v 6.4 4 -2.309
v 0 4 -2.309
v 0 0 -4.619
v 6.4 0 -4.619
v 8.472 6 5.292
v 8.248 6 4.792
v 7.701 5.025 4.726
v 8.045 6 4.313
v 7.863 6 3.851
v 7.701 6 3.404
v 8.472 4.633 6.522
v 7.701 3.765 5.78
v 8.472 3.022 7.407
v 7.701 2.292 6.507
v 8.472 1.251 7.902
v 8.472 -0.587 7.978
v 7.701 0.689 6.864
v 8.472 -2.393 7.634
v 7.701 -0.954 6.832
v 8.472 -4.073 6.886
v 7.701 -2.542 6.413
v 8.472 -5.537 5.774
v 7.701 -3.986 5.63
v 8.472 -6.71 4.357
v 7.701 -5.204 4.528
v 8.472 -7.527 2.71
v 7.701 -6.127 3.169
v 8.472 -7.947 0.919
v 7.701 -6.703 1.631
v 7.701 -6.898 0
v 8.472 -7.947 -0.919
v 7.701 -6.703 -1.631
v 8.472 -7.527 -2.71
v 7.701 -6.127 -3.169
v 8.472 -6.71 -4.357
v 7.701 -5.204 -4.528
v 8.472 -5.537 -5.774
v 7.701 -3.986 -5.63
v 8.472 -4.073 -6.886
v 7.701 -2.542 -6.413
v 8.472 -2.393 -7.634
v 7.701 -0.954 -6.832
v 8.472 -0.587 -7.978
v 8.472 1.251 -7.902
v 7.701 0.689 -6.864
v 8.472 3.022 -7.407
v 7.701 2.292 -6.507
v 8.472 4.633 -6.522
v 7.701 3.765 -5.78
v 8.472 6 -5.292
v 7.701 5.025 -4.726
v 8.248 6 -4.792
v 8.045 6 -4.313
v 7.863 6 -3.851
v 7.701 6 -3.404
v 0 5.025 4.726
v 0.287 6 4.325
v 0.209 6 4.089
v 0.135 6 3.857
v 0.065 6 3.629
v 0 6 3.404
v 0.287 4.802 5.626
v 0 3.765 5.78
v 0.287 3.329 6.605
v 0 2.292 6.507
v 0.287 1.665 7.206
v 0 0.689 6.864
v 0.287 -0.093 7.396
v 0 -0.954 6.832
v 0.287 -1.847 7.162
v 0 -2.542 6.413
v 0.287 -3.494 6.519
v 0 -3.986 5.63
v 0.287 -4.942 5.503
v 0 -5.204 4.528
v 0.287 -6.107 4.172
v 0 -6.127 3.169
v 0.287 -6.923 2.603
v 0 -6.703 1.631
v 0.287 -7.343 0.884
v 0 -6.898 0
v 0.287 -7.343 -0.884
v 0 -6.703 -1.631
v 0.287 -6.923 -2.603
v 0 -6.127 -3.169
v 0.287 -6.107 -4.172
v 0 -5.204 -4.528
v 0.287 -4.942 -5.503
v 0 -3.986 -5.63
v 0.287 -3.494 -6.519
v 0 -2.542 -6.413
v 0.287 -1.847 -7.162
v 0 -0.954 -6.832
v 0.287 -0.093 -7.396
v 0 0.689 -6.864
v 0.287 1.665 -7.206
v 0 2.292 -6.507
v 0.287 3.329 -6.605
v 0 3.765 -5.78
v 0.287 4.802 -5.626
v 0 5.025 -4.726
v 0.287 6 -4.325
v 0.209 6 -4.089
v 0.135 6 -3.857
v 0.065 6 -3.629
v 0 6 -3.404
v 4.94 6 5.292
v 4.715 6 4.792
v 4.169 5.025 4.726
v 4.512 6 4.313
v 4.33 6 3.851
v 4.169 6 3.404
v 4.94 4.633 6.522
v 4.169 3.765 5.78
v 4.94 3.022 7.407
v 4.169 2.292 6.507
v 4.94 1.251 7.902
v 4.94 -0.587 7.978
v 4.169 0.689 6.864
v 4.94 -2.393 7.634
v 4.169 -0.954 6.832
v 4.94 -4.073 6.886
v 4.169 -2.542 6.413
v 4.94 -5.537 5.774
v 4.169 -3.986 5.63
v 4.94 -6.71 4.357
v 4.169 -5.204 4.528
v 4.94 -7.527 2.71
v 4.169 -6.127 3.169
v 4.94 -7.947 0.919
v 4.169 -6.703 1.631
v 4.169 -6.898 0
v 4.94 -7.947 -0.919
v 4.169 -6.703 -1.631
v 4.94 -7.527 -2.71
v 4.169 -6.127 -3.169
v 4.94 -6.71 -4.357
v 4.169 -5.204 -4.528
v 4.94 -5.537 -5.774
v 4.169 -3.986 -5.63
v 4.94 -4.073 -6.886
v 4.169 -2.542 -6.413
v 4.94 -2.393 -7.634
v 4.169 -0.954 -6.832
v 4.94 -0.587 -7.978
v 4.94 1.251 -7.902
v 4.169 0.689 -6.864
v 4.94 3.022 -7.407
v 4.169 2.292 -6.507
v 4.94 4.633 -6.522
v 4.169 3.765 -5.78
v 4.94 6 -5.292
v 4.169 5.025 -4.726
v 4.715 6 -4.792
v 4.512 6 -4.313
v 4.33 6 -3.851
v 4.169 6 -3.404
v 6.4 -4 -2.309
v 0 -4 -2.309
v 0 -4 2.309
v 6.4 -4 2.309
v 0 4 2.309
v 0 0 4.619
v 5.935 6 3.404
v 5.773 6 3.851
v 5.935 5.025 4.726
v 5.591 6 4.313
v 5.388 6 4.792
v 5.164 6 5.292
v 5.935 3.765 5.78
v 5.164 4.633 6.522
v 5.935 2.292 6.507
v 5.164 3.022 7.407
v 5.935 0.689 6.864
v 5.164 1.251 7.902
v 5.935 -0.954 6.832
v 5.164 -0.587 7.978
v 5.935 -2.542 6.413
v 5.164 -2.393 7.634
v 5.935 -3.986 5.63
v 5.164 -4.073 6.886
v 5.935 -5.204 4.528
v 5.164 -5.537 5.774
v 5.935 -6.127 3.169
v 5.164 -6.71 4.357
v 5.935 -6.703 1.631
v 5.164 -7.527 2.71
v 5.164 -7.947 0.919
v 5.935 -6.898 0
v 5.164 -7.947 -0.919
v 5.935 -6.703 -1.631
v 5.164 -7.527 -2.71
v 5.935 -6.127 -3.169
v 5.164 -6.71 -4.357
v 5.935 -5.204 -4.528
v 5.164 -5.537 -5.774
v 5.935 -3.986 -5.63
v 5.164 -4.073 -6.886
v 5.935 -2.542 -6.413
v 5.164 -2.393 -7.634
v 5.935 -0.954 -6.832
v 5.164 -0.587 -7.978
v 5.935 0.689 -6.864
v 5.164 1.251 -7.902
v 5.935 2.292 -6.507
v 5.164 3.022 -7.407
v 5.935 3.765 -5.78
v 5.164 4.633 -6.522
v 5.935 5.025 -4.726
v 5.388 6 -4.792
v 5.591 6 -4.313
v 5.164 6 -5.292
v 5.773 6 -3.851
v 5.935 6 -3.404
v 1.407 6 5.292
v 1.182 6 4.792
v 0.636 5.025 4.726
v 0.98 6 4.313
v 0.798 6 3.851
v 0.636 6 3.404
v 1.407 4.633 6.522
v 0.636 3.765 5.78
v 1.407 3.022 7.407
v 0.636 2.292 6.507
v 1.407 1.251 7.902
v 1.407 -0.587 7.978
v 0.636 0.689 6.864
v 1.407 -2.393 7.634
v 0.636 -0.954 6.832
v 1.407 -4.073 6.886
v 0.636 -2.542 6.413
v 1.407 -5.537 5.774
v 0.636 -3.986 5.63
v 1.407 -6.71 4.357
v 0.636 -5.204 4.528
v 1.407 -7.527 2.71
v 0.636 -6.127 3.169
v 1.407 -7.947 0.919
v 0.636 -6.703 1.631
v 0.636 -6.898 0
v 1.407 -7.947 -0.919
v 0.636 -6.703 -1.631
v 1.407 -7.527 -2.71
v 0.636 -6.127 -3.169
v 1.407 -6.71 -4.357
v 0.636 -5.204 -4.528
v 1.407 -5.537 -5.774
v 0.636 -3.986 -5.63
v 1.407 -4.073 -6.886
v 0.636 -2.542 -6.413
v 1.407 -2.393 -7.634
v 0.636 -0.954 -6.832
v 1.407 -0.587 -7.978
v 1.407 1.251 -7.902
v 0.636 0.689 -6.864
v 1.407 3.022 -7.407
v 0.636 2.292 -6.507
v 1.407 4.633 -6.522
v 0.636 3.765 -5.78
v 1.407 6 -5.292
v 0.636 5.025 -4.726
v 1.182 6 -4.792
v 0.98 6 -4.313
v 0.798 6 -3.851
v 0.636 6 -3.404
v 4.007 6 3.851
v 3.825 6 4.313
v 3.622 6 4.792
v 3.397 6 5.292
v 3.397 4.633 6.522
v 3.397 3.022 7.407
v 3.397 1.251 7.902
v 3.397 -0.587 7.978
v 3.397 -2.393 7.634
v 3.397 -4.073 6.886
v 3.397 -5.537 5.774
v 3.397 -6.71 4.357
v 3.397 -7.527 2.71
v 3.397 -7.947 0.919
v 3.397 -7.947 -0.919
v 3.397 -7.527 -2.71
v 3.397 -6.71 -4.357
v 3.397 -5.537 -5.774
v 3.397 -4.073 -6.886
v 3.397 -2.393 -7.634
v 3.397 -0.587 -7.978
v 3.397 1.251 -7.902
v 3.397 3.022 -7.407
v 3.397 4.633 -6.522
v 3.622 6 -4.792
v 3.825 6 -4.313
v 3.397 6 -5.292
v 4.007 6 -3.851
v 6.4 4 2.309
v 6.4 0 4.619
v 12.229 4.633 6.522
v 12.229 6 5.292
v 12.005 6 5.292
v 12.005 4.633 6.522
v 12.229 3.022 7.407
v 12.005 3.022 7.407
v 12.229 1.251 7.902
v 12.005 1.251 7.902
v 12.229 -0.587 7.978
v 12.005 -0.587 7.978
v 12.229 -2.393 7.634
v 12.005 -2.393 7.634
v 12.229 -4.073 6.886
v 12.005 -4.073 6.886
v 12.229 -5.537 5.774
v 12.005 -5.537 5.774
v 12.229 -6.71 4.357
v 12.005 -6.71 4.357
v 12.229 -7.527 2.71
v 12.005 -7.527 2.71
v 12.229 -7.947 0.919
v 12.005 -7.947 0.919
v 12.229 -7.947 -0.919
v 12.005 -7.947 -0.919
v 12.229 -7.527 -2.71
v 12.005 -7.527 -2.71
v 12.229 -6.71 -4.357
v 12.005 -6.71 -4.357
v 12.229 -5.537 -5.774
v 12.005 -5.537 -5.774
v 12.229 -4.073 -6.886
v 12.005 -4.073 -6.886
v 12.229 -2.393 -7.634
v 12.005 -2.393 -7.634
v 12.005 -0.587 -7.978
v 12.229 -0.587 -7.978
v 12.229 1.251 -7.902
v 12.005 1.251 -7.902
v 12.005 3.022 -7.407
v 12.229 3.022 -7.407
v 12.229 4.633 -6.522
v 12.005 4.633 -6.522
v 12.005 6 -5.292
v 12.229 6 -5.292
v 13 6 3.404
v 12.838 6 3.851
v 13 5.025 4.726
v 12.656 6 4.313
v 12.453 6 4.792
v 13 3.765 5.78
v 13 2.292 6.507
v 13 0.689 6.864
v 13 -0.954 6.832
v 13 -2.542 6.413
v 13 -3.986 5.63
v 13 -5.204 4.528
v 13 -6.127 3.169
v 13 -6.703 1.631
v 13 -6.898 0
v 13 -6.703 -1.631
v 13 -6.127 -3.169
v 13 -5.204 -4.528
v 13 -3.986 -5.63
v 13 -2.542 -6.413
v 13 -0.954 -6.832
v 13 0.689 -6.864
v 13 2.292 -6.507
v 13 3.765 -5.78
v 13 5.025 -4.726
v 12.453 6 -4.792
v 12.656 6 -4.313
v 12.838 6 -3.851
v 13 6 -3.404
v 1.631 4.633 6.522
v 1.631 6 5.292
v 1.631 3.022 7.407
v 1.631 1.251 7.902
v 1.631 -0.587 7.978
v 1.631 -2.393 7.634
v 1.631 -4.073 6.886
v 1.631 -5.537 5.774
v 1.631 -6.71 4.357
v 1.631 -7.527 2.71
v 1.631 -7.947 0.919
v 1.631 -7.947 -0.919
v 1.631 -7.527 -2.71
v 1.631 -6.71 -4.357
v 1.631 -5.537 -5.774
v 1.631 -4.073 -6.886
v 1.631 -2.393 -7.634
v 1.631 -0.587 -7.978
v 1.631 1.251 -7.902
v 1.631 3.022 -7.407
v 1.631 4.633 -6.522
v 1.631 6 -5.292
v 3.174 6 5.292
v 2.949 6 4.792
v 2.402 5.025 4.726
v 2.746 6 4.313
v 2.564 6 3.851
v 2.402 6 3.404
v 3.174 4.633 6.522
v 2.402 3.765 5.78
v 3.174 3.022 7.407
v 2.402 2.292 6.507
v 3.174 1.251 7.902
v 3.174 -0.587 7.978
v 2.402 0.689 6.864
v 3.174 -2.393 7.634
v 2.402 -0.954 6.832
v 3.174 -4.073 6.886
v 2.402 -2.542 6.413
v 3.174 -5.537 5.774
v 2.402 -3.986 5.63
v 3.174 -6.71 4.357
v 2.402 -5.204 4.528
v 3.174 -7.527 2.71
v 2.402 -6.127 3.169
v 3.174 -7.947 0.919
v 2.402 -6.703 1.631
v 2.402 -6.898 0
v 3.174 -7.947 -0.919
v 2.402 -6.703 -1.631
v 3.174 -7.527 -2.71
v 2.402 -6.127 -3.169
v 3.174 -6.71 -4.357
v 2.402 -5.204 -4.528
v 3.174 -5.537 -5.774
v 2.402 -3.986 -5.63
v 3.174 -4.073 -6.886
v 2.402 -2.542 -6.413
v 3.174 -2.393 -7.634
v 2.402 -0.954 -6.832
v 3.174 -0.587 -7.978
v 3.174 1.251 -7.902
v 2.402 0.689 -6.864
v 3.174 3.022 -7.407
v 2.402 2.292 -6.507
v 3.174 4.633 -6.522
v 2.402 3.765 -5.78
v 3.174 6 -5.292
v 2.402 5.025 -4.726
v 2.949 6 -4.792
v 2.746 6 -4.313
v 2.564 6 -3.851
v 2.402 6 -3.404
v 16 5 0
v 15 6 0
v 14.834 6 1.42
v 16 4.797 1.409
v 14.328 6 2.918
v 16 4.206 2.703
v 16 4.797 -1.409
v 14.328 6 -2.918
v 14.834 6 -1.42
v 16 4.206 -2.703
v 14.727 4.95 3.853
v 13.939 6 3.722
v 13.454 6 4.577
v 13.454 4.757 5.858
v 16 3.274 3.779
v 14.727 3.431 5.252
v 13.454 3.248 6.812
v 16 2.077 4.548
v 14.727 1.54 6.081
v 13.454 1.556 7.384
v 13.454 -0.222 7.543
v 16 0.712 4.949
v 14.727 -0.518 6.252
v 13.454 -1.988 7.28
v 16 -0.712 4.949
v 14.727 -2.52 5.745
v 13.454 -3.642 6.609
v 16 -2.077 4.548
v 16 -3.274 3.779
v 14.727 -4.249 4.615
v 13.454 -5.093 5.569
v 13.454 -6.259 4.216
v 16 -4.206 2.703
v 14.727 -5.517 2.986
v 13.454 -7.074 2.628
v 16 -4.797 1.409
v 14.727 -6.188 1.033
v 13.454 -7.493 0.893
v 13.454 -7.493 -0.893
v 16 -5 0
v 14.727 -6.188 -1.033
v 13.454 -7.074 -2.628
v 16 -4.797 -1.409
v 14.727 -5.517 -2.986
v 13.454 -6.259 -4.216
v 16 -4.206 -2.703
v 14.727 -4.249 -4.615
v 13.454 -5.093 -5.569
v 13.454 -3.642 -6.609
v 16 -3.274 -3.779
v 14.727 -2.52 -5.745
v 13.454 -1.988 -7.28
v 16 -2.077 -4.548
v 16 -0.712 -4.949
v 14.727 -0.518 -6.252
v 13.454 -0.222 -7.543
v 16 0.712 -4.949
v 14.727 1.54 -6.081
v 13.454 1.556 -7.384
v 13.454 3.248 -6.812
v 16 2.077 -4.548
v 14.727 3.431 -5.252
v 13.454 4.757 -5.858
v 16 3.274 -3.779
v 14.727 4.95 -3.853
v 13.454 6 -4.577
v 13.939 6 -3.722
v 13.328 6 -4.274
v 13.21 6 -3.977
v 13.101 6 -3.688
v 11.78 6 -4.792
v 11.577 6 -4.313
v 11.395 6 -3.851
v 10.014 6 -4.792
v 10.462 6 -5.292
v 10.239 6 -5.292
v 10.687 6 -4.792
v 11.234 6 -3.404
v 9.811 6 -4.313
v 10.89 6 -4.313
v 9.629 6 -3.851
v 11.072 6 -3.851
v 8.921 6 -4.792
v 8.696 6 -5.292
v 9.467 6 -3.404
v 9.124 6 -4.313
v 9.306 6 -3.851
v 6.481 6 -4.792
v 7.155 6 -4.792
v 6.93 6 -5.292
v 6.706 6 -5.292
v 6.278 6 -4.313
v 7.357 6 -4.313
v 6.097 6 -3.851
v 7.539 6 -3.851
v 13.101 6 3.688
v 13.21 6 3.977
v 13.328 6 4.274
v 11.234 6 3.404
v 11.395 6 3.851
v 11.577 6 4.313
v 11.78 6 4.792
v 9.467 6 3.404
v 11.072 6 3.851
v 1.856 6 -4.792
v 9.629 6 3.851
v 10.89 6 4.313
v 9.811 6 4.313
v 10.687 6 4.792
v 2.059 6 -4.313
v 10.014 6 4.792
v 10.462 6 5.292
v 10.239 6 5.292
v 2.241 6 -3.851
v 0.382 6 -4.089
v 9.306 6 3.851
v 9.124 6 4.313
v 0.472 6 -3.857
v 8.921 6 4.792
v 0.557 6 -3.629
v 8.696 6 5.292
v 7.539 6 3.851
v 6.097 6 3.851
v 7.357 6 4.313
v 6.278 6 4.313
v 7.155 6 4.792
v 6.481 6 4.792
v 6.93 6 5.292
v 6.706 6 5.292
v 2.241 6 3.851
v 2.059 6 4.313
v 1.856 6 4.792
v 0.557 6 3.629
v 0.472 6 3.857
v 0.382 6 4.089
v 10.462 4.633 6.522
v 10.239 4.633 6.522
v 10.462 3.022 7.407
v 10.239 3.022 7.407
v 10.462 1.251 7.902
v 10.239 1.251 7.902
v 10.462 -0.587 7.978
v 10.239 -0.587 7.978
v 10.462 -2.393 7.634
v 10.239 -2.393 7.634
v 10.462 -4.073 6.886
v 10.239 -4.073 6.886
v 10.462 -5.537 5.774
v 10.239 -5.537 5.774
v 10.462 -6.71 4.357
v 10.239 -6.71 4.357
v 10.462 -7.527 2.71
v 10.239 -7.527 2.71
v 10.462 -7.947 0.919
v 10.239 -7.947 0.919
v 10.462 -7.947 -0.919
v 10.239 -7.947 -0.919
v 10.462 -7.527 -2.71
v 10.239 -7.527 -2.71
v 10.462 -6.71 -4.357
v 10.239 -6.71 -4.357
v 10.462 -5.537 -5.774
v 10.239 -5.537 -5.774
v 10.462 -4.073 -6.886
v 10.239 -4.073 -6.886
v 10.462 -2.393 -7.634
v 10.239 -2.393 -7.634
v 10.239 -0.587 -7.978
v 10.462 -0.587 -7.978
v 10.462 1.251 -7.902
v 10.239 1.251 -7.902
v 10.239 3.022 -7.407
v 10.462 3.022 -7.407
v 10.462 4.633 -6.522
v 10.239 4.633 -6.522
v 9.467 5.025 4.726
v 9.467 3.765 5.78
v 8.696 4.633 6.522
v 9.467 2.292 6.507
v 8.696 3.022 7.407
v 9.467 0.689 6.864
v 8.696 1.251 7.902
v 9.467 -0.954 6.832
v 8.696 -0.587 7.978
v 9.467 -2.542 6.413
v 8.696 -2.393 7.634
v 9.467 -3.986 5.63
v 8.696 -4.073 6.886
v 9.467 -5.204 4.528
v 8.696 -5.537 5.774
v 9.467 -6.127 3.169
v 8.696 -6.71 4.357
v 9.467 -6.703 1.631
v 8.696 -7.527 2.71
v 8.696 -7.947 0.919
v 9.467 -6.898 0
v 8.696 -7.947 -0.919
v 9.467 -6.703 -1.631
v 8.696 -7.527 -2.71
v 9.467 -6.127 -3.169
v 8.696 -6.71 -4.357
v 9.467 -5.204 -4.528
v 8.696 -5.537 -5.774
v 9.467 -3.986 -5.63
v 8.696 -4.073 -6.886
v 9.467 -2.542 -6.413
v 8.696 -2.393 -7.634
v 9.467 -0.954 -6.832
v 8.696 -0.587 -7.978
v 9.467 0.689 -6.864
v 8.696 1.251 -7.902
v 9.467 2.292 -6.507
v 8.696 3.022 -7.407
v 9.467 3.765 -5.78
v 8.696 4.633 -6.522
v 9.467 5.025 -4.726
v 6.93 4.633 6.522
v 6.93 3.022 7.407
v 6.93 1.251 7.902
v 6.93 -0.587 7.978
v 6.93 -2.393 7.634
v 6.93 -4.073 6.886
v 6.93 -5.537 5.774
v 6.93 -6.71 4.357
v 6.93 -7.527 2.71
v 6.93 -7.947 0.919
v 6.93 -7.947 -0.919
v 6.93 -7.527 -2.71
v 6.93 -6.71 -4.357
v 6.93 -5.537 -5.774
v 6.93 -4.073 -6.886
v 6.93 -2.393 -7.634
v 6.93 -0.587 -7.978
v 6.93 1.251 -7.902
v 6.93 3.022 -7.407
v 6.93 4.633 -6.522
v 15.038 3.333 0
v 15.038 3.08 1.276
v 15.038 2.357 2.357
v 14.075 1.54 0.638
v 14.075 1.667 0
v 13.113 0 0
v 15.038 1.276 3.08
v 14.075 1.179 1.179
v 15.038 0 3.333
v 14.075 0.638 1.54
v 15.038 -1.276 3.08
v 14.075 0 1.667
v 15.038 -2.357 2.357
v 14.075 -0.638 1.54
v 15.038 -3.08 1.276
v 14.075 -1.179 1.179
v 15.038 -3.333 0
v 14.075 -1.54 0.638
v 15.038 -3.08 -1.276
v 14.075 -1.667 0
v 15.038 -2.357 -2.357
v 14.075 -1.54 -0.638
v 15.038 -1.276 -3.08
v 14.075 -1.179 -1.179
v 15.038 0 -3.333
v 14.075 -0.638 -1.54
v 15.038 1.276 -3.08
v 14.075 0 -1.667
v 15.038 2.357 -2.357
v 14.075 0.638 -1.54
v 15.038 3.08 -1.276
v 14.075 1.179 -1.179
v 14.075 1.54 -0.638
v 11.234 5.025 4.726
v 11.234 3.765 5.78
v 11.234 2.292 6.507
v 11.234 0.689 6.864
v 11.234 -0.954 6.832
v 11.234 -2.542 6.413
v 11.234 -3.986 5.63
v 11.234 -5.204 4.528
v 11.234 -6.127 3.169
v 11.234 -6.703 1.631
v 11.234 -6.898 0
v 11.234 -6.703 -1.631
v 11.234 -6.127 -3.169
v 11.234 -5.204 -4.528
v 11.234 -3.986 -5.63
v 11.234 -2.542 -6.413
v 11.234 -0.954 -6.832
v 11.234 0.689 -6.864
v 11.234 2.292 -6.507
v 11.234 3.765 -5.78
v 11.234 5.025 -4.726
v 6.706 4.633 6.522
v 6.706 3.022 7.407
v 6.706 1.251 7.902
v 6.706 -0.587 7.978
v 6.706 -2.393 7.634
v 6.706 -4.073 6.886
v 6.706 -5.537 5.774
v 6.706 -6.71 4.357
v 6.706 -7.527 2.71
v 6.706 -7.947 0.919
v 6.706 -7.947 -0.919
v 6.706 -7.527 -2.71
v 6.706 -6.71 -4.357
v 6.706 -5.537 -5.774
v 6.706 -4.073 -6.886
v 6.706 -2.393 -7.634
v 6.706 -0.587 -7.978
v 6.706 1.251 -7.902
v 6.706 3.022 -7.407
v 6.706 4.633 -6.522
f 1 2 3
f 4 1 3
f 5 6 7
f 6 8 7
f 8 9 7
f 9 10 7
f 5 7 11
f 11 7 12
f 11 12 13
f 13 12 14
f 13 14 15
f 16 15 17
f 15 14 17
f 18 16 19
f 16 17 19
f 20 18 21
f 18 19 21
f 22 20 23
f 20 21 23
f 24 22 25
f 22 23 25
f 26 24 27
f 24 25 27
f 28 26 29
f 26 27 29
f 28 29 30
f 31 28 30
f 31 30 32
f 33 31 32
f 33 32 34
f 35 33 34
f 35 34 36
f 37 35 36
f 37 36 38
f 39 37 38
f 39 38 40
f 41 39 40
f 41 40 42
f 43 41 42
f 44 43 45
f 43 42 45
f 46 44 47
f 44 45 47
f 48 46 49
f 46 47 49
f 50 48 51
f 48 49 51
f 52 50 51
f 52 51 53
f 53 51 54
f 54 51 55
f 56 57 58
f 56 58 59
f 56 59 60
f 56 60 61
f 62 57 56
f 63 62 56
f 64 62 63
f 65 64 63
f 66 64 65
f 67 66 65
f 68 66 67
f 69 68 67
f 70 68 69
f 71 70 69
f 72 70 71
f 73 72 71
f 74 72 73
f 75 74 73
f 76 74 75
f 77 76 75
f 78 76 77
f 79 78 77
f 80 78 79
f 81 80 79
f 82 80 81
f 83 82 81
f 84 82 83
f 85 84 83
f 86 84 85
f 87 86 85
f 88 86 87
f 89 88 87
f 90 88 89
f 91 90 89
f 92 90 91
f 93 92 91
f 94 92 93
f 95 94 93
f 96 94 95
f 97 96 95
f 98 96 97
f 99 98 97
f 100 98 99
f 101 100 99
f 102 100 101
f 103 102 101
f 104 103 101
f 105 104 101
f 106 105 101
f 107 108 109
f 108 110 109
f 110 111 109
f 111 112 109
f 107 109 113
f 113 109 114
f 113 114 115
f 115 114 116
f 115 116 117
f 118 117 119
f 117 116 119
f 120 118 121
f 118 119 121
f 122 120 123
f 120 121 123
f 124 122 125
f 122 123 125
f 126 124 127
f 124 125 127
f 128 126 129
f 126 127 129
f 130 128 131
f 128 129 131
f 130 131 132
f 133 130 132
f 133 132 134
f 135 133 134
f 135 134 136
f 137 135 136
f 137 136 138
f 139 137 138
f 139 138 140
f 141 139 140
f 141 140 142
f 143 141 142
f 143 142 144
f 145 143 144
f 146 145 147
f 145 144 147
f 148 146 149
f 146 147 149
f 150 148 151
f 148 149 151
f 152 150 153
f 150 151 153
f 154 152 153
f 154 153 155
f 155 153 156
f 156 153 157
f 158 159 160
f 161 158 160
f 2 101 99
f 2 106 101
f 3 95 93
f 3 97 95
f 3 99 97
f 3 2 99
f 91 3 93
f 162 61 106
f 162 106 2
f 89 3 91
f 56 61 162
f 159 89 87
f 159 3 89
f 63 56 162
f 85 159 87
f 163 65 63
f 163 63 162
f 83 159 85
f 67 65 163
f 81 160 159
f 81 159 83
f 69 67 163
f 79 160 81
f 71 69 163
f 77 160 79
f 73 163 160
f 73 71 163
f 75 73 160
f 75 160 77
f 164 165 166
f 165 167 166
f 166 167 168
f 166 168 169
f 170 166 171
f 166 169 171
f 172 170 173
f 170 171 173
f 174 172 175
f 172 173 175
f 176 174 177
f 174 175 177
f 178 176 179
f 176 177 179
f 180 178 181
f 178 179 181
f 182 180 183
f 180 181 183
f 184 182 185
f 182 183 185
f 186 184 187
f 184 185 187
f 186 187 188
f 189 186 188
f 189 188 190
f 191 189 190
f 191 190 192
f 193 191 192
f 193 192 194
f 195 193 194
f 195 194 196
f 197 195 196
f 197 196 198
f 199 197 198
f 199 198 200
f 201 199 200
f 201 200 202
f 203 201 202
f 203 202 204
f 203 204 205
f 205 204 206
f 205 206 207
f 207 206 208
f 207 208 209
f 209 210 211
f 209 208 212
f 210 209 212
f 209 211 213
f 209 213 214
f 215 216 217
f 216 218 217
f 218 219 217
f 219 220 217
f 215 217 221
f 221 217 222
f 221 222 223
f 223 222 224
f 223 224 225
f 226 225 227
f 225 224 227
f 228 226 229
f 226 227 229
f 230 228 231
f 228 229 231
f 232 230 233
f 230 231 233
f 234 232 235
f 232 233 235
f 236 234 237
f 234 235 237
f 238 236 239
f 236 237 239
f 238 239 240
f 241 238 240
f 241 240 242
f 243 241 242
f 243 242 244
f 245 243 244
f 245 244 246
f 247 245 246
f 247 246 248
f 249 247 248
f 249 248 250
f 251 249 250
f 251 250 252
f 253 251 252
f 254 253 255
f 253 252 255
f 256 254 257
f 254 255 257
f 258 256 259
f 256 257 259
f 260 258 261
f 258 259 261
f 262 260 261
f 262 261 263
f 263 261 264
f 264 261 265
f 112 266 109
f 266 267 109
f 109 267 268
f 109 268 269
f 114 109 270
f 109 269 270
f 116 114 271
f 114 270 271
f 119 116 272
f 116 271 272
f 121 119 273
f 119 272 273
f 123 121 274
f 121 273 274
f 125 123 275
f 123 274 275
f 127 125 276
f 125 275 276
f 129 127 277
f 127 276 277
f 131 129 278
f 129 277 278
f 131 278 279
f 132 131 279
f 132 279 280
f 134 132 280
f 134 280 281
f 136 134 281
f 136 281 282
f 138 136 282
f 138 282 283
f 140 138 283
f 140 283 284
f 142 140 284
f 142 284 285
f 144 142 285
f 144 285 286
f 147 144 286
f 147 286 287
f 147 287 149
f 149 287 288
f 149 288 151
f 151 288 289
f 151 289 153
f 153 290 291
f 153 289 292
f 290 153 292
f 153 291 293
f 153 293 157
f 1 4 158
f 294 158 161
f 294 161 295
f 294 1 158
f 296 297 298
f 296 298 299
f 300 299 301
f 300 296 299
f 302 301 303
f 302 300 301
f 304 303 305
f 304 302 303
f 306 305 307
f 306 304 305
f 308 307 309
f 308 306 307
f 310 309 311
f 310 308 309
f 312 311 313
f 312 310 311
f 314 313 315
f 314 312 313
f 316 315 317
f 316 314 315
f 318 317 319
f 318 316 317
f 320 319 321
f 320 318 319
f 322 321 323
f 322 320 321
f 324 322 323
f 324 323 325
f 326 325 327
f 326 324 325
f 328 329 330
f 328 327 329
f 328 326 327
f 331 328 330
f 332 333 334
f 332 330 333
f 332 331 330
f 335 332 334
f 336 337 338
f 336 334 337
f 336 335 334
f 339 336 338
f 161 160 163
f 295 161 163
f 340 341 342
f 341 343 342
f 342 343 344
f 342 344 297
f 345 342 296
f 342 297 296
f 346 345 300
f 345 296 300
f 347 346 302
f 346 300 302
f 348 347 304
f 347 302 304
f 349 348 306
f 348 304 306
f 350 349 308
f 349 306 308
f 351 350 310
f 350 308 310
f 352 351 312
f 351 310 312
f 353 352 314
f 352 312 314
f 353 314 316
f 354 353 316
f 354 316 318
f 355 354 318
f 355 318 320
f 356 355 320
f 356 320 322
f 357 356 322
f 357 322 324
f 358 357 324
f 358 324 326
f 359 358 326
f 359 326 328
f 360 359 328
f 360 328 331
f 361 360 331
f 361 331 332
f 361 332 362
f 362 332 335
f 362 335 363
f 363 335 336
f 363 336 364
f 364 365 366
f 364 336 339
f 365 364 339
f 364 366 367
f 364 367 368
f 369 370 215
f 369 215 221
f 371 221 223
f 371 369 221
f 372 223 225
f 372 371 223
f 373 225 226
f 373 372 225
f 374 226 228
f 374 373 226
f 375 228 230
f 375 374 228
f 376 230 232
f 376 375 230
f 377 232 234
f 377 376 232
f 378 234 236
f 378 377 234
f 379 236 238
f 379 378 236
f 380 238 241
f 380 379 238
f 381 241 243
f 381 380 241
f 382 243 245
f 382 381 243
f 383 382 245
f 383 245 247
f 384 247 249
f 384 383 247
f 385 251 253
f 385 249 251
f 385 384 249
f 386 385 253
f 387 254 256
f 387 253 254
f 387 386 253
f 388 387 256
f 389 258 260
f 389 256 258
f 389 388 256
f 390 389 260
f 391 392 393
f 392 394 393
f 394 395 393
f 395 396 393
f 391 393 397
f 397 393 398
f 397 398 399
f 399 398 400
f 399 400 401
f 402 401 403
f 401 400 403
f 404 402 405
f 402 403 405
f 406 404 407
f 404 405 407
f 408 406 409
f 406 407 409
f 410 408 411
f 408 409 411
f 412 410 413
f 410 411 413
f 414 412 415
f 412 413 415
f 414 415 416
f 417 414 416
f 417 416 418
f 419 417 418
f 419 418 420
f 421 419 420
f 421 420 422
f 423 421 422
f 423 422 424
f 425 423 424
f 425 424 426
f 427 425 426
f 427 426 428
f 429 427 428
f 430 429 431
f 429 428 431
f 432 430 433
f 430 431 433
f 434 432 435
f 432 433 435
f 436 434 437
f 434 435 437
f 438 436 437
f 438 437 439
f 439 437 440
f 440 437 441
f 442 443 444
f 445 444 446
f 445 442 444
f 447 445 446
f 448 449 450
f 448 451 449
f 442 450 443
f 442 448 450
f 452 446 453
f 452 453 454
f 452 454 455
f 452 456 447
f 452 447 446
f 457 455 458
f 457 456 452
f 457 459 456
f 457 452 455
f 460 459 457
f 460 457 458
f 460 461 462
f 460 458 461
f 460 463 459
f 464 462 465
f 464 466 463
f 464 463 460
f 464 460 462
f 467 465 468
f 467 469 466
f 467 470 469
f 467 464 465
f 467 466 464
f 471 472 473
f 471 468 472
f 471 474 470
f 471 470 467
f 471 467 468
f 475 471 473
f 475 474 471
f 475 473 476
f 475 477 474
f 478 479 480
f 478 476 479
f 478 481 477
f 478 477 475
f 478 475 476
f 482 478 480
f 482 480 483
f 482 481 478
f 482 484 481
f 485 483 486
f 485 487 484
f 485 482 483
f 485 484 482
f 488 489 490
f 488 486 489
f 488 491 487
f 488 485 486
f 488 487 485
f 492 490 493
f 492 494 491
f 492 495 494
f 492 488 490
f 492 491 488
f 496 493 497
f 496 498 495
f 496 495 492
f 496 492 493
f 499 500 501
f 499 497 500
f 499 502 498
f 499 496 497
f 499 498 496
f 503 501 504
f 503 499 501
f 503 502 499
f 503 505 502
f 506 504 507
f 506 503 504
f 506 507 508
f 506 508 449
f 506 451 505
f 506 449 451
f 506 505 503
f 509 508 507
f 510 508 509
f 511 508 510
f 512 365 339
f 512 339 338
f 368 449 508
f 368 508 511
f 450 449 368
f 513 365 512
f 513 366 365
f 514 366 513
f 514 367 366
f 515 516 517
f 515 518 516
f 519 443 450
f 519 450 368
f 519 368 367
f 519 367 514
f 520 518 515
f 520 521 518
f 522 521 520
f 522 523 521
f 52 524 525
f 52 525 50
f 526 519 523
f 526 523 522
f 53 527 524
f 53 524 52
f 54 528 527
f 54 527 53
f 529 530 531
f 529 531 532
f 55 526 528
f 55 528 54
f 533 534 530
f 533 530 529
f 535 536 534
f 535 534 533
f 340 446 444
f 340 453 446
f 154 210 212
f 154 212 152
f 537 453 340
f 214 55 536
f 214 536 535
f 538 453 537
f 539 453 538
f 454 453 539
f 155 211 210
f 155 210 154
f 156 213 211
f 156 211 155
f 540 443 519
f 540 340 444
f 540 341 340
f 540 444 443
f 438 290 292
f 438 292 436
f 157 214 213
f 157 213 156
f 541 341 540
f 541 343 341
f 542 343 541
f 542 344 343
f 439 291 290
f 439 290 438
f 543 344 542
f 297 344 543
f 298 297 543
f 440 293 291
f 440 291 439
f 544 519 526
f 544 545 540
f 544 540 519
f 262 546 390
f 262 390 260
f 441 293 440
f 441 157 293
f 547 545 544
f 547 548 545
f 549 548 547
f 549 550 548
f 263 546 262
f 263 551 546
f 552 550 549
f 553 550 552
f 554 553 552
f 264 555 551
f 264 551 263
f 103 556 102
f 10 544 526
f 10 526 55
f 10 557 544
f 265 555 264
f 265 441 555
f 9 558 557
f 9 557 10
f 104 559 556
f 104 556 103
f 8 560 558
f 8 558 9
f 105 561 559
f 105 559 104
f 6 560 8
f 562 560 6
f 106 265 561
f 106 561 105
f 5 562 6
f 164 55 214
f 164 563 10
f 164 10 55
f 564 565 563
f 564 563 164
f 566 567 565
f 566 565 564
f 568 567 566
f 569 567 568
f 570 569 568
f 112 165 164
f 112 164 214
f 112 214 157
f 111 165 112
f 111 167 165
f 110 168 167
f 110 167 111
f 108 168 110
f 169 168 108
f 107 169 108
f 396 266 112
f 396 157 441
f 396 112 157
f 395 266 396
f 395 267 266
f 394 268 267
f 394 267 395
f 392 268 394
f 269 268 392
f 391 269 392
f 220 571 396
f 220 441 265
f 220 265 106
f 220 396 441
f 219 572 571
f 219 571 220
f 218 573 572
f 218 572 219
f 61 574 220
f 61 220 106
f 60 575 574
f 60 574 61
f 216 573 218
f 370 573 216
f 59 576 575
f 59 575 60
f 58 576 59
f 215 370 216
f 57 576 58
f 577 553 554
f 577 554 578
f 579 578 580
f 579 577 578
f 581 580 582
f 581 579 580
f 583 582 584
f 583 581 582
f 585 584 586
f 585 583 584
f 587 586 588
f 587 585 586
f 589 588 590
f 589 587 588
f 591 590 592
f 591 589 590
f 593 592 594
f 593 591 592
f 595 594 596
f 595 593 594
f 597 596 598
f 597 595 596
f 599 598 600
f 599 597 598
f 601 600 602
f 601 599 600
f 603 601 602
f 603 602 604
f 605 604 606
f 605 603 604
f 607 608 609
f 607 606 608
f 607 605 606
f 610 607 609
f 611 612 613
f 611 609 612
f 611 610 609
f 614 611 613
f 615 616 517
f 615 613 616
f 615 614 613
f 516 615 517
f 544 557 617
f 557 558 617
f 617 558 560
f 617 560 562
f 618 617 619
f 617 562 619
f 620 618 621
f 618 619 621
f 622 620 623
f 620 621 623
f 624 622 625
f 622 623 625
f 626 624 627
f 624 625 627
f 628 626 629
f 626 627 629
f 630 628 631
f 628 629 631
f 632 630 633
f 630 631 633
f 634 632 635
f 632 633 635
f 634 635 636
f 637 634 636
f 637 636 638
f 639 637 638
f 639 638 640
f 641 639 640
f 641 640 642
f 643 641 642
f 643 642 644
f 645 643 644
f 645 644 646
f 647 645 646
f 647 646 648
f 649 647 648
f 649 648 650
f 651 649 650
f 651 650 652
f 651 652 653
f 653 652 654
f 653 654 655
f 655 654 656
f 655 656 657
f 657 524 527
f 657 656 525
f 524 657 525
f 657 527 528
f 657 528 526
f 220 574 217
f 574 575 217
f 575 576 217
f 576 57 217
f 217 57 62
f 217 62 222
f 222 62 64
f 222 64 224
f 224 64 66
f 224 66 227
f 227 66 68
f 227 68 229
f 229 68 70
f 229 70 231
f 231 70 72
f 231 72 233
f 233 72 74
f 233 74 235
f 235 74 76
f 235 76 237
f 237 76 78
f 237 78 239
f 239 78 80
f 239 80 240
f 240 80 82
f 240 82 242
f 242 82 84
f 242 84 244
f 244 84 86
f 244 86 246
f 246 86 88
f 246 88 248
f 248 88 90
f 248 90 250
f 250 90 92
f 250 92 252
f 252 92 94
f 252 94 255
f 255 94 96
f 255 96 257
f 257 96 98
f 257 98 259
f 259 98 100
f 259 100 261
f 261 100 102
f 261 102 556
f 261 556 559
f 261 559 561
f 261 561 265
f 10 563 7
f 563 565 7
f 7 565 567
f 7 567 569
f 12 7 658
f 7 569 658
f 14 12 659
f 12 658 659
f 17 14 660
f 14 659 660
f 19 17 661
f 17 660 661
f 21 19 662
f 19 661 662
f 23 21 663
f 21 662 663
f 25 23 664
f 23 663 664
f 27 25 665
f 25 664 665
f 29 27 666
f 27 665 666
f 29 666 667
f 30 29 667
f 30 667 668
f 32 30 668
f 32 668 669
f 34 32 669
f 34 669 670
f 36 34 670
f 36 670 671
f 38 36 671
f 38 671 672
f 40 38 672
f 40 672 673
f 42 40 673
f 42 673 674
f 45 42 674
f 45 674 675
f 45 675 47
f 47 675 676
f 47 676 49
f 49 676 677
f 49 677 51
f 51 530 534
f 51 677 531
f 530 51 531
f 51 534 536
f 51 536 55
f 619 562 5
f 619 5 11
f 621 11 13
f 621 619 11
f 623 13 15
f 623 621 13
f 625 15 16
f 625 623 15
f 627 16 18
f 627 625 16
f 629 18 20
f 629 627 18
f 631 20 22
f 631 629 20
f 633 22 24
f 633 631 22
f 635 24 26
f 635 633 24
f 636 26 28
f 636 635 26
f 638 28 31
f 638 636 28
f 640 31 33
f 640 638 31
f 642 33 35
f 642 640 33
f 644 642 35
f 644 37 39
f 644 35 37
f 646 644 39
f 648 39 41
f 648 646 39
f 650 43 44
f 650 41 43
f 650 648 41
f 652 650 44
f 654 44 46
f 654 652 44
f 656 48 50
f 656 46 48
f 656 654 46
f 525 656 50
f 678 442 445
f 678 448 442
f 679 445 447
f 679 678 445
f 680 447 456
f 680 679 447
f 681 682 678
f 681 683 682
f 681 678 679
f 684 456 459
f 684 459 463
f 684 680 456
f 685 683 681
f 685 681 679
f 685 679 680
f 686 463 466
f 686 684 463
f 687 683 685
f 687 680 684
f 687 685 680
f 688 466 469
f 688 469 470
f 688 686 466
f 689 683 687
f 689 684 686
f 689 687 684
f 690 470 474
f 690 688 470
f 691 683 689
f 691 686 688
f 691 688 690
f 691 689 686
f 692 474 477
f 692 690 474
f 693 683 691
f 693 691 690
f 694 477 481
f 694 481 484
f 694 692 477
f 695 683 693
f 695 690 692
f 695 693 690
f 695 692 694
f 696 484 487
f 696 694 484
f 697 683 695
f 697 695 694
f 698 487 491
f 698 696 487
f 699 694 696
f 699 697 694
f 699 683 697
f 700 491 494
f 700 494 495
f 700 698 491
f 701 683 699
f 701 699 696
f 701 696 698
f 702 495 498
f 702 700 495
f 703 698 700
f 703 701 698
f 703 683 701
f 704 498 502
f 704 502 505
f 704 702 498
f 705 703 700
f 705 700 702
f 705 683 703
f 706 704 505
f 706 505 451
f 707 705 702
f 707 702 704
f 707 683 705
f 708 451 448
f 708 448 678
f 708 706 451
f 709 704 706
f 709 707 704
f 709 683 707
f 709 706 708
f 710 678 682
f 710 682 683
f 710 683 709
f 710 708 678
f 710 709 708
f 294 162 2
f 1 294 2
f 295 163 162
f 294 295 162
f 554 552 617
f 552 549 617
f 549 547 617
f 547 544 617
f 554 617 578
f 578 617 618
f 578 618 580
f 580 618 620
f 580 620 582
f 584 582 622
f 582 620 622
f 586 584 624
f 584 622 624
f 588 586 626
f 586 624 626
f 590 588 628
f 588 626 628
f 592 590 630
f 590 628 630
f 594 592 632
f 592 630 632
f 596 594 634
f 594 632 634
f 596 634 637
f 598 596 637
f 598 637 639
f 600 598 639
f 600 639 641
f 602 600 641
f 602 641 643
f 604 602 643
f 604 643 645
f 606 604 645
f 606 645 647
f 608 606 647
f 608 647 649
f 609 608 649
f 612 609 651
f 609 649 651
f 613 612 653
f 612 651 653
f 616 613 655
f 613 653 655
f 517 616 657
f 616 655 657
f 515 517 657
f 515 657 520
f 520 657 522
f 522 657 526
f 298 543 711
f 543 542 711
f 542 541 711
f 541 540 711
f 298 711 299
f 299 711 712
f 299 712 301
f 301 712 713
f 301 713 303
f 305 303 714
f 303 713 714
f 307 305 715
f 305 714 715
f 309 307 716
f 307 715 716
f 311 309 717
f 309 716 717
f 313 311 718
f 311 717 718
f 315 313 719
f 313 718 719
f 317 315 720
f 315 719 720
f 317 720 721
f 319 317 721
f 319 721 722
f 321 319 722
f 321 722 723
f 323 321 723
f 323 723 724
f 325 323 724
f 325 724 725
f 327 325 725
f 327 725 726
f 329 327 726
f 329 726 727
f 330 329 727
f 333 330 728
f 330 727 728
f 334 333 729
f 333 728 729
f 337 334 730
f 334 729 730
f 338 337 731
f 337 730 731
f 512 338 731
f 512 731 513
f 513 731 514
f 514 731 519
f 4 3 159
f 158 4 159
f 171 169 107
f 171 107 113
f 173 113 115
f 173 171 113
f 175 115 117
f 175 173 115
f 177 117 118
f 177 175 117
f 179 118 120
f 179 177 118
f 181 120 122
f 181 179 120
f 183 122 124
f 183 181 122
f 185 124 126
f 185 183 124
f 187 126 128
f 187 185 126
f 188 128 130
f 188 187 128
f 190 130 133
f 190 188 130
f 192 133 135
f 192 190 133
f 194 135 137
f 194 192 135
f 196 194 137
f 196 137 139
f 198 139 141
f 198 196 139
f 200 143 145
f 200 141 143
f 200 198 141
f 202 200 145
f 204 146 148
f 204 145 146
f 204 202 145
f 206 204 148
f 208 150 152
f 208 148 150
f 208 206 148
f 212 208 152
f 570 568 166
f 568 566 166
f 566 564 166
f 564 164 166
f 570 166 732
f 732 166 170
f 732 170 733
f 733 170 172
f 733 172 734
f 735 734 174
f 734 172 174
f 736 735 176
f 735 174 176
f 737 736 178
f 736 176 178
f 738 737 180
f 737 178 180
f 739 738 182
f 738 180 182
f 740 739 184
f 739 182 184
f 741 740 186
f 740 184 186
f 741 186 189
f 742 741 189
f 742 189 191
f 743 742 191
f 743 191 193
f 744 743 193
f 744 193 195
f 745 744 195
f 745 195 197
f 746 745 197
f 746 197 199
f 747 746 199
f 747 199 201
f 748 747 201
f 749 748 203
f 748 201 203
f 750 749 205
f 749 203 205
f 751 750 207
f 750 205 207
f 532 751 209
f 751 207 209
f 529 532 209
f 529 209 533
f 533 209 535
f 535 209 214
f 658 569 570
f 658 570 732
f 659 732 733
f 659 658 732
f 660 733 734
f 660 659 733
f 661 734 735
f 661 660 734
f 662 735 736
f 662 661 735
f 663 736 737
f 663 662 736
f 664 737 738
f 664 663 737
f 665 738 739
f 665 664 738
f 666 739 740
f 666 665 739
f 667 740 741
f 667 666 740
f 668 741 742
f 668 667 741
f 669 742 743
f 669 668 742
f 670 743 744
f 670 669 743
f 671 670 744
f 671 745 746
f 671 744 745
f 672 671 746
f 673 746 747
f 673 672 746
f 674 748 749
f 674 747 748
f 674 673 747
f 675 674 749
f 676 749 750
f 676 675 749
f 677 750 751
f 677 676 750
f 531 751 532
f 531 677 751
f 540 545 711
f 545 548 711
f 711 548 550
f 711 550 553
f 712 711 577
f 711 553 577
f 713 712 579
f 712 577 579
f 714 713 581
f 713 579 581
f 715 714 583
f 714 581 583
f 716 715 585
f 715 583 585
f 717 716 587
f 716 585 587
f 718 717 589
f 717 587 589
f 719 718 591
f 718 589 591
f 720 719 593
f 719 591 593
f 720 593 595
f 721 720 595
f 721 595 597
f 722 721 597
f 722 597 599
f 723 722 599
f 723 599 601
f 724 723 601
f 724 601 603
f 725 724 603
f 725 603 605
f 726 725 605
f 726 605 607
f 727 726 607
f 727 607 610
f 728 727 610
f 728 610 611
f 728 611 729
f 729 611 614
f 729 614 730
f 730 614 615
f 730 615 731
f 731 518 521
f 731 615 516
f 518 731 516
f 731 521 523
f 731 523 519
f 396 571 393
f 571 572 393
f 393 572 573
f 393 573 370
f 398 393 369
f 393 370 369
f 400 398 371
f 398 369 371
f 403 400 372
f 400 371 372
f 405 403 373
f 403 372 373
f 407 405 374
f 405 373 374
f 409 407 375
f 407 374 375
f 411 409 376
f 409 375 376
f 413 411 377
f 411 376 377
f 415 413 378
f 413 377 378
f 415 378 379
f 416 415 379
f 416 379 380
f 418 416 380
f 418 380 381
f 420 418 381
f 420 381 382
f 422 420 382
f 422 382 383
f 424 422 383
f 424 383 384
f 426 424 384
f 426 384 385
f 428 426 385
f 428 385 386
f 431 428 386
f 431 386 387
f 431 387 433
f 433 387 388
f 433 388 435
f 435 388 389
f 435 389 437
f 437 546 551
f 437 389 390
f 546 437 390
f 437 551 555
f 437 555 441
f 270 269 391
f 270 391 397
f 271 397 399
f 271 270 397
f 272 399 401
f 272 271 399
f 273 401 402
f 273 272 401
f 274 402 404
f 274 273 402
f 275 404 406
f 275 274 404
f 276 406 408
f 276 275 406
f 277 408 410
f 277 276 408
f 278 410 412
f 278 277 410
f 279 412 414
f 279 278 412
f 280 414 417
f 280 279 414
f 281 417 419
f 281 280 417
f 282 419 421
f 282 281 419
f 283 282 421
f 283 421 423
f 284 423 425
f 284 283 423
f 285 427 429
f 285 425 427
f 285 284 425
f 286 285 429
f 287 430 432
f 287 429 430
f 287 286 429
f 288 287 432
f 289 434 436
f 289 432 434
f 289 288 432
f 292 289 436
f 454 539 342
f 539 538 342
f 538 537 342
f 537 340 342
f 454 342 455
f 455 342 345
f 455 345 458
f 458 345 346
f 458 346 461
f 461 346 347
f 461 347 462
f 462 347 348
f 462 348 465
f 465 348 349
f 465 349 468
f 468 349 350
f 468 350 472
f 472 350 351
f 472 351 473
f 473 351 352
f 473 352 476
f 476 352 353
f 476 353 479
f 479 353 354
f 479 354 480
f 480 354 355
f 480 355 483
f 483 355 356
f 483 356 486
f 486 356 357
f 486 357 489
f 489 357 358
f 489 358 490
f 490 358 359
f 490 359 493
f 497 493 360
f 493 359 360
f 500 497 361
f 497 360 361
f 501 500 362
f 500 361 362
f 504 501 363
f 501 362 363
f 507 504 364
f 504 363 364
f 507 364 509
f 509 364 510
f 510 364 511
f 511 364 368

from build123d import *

# Parameters (mm, degrees)
HEX_2_DEPTH        = 6.4
THDSCHPAT_COUNT    = 8
THDSCHPAT_PITCH    = 1.766292682
SKETCH3_W          = 30.420600684
SKETCH3_H          = 33.851495499
CUT_EXTRUDE1_DEPTH = 2


with BuildPart() as part:
    # BodySke → BaseBody (revolve)
    with BuildSketch(Plane.XY):
        Polygon((0, 0), (0, 6.8985), (0.635951322, 8), (13, 8), (16, 5), (13.113248654, 0), align=None)
    revolve(axis=Axis((-12.7, 0, 0), (1, 0, 0)))

    # Sketch2 → Hex 2 (cut)
    with BuildSketch(Plane.ZY):
        Polygon((2.309401077, 4), (-2.309401077, 4), (-4.618802154, 0), (-2.309401077, -4), (2.309401077, -4), (4.618802154, 0), align=None)
    extrude(amount=-HEX_2_DEPTH, mode=Mode.SUBTRACT)

    # ThdSchSke → ThreadSchematic (revolve, cut)
    with BuildSketch(Plane.XY):
        Polygon((0.635951322, -6.8985), (-0.135327282, -8), (-0.135327282, -10), (1.407229925, -10), (1.407229925, -8), align=None)
    threadschematic = revolve(axis=Axis((-3.175, 0, 0), (1, 0, 0)), mode=Mode.SUBTRACT)

    # ThdSchPat: ThreadSchematic ×8
    with Locations(*[(i * THDSCHPAT_PITCH, 0, 0) for i in range(1, THDSCHPAT_COUNT)]):
        add(threadschematic, mode=Mode.SUBTRACT)

    # Sketch3 → Cut-Extrude1 (cut)
    with BuildSketch(Plane(origin=(0, 8, 0), x_dir=(-1, 0, 0), z_dir=(0, 1, 0))):
        with Locations((-7.768215545, -1.918808929)):
            Rectangle(SKETCH3_W, SKETCH3_H)
    extrude(amount=-CUT_EXTRUDE1_DEPTH, mode=Mode.SUBTRACT)


solid = part.part
